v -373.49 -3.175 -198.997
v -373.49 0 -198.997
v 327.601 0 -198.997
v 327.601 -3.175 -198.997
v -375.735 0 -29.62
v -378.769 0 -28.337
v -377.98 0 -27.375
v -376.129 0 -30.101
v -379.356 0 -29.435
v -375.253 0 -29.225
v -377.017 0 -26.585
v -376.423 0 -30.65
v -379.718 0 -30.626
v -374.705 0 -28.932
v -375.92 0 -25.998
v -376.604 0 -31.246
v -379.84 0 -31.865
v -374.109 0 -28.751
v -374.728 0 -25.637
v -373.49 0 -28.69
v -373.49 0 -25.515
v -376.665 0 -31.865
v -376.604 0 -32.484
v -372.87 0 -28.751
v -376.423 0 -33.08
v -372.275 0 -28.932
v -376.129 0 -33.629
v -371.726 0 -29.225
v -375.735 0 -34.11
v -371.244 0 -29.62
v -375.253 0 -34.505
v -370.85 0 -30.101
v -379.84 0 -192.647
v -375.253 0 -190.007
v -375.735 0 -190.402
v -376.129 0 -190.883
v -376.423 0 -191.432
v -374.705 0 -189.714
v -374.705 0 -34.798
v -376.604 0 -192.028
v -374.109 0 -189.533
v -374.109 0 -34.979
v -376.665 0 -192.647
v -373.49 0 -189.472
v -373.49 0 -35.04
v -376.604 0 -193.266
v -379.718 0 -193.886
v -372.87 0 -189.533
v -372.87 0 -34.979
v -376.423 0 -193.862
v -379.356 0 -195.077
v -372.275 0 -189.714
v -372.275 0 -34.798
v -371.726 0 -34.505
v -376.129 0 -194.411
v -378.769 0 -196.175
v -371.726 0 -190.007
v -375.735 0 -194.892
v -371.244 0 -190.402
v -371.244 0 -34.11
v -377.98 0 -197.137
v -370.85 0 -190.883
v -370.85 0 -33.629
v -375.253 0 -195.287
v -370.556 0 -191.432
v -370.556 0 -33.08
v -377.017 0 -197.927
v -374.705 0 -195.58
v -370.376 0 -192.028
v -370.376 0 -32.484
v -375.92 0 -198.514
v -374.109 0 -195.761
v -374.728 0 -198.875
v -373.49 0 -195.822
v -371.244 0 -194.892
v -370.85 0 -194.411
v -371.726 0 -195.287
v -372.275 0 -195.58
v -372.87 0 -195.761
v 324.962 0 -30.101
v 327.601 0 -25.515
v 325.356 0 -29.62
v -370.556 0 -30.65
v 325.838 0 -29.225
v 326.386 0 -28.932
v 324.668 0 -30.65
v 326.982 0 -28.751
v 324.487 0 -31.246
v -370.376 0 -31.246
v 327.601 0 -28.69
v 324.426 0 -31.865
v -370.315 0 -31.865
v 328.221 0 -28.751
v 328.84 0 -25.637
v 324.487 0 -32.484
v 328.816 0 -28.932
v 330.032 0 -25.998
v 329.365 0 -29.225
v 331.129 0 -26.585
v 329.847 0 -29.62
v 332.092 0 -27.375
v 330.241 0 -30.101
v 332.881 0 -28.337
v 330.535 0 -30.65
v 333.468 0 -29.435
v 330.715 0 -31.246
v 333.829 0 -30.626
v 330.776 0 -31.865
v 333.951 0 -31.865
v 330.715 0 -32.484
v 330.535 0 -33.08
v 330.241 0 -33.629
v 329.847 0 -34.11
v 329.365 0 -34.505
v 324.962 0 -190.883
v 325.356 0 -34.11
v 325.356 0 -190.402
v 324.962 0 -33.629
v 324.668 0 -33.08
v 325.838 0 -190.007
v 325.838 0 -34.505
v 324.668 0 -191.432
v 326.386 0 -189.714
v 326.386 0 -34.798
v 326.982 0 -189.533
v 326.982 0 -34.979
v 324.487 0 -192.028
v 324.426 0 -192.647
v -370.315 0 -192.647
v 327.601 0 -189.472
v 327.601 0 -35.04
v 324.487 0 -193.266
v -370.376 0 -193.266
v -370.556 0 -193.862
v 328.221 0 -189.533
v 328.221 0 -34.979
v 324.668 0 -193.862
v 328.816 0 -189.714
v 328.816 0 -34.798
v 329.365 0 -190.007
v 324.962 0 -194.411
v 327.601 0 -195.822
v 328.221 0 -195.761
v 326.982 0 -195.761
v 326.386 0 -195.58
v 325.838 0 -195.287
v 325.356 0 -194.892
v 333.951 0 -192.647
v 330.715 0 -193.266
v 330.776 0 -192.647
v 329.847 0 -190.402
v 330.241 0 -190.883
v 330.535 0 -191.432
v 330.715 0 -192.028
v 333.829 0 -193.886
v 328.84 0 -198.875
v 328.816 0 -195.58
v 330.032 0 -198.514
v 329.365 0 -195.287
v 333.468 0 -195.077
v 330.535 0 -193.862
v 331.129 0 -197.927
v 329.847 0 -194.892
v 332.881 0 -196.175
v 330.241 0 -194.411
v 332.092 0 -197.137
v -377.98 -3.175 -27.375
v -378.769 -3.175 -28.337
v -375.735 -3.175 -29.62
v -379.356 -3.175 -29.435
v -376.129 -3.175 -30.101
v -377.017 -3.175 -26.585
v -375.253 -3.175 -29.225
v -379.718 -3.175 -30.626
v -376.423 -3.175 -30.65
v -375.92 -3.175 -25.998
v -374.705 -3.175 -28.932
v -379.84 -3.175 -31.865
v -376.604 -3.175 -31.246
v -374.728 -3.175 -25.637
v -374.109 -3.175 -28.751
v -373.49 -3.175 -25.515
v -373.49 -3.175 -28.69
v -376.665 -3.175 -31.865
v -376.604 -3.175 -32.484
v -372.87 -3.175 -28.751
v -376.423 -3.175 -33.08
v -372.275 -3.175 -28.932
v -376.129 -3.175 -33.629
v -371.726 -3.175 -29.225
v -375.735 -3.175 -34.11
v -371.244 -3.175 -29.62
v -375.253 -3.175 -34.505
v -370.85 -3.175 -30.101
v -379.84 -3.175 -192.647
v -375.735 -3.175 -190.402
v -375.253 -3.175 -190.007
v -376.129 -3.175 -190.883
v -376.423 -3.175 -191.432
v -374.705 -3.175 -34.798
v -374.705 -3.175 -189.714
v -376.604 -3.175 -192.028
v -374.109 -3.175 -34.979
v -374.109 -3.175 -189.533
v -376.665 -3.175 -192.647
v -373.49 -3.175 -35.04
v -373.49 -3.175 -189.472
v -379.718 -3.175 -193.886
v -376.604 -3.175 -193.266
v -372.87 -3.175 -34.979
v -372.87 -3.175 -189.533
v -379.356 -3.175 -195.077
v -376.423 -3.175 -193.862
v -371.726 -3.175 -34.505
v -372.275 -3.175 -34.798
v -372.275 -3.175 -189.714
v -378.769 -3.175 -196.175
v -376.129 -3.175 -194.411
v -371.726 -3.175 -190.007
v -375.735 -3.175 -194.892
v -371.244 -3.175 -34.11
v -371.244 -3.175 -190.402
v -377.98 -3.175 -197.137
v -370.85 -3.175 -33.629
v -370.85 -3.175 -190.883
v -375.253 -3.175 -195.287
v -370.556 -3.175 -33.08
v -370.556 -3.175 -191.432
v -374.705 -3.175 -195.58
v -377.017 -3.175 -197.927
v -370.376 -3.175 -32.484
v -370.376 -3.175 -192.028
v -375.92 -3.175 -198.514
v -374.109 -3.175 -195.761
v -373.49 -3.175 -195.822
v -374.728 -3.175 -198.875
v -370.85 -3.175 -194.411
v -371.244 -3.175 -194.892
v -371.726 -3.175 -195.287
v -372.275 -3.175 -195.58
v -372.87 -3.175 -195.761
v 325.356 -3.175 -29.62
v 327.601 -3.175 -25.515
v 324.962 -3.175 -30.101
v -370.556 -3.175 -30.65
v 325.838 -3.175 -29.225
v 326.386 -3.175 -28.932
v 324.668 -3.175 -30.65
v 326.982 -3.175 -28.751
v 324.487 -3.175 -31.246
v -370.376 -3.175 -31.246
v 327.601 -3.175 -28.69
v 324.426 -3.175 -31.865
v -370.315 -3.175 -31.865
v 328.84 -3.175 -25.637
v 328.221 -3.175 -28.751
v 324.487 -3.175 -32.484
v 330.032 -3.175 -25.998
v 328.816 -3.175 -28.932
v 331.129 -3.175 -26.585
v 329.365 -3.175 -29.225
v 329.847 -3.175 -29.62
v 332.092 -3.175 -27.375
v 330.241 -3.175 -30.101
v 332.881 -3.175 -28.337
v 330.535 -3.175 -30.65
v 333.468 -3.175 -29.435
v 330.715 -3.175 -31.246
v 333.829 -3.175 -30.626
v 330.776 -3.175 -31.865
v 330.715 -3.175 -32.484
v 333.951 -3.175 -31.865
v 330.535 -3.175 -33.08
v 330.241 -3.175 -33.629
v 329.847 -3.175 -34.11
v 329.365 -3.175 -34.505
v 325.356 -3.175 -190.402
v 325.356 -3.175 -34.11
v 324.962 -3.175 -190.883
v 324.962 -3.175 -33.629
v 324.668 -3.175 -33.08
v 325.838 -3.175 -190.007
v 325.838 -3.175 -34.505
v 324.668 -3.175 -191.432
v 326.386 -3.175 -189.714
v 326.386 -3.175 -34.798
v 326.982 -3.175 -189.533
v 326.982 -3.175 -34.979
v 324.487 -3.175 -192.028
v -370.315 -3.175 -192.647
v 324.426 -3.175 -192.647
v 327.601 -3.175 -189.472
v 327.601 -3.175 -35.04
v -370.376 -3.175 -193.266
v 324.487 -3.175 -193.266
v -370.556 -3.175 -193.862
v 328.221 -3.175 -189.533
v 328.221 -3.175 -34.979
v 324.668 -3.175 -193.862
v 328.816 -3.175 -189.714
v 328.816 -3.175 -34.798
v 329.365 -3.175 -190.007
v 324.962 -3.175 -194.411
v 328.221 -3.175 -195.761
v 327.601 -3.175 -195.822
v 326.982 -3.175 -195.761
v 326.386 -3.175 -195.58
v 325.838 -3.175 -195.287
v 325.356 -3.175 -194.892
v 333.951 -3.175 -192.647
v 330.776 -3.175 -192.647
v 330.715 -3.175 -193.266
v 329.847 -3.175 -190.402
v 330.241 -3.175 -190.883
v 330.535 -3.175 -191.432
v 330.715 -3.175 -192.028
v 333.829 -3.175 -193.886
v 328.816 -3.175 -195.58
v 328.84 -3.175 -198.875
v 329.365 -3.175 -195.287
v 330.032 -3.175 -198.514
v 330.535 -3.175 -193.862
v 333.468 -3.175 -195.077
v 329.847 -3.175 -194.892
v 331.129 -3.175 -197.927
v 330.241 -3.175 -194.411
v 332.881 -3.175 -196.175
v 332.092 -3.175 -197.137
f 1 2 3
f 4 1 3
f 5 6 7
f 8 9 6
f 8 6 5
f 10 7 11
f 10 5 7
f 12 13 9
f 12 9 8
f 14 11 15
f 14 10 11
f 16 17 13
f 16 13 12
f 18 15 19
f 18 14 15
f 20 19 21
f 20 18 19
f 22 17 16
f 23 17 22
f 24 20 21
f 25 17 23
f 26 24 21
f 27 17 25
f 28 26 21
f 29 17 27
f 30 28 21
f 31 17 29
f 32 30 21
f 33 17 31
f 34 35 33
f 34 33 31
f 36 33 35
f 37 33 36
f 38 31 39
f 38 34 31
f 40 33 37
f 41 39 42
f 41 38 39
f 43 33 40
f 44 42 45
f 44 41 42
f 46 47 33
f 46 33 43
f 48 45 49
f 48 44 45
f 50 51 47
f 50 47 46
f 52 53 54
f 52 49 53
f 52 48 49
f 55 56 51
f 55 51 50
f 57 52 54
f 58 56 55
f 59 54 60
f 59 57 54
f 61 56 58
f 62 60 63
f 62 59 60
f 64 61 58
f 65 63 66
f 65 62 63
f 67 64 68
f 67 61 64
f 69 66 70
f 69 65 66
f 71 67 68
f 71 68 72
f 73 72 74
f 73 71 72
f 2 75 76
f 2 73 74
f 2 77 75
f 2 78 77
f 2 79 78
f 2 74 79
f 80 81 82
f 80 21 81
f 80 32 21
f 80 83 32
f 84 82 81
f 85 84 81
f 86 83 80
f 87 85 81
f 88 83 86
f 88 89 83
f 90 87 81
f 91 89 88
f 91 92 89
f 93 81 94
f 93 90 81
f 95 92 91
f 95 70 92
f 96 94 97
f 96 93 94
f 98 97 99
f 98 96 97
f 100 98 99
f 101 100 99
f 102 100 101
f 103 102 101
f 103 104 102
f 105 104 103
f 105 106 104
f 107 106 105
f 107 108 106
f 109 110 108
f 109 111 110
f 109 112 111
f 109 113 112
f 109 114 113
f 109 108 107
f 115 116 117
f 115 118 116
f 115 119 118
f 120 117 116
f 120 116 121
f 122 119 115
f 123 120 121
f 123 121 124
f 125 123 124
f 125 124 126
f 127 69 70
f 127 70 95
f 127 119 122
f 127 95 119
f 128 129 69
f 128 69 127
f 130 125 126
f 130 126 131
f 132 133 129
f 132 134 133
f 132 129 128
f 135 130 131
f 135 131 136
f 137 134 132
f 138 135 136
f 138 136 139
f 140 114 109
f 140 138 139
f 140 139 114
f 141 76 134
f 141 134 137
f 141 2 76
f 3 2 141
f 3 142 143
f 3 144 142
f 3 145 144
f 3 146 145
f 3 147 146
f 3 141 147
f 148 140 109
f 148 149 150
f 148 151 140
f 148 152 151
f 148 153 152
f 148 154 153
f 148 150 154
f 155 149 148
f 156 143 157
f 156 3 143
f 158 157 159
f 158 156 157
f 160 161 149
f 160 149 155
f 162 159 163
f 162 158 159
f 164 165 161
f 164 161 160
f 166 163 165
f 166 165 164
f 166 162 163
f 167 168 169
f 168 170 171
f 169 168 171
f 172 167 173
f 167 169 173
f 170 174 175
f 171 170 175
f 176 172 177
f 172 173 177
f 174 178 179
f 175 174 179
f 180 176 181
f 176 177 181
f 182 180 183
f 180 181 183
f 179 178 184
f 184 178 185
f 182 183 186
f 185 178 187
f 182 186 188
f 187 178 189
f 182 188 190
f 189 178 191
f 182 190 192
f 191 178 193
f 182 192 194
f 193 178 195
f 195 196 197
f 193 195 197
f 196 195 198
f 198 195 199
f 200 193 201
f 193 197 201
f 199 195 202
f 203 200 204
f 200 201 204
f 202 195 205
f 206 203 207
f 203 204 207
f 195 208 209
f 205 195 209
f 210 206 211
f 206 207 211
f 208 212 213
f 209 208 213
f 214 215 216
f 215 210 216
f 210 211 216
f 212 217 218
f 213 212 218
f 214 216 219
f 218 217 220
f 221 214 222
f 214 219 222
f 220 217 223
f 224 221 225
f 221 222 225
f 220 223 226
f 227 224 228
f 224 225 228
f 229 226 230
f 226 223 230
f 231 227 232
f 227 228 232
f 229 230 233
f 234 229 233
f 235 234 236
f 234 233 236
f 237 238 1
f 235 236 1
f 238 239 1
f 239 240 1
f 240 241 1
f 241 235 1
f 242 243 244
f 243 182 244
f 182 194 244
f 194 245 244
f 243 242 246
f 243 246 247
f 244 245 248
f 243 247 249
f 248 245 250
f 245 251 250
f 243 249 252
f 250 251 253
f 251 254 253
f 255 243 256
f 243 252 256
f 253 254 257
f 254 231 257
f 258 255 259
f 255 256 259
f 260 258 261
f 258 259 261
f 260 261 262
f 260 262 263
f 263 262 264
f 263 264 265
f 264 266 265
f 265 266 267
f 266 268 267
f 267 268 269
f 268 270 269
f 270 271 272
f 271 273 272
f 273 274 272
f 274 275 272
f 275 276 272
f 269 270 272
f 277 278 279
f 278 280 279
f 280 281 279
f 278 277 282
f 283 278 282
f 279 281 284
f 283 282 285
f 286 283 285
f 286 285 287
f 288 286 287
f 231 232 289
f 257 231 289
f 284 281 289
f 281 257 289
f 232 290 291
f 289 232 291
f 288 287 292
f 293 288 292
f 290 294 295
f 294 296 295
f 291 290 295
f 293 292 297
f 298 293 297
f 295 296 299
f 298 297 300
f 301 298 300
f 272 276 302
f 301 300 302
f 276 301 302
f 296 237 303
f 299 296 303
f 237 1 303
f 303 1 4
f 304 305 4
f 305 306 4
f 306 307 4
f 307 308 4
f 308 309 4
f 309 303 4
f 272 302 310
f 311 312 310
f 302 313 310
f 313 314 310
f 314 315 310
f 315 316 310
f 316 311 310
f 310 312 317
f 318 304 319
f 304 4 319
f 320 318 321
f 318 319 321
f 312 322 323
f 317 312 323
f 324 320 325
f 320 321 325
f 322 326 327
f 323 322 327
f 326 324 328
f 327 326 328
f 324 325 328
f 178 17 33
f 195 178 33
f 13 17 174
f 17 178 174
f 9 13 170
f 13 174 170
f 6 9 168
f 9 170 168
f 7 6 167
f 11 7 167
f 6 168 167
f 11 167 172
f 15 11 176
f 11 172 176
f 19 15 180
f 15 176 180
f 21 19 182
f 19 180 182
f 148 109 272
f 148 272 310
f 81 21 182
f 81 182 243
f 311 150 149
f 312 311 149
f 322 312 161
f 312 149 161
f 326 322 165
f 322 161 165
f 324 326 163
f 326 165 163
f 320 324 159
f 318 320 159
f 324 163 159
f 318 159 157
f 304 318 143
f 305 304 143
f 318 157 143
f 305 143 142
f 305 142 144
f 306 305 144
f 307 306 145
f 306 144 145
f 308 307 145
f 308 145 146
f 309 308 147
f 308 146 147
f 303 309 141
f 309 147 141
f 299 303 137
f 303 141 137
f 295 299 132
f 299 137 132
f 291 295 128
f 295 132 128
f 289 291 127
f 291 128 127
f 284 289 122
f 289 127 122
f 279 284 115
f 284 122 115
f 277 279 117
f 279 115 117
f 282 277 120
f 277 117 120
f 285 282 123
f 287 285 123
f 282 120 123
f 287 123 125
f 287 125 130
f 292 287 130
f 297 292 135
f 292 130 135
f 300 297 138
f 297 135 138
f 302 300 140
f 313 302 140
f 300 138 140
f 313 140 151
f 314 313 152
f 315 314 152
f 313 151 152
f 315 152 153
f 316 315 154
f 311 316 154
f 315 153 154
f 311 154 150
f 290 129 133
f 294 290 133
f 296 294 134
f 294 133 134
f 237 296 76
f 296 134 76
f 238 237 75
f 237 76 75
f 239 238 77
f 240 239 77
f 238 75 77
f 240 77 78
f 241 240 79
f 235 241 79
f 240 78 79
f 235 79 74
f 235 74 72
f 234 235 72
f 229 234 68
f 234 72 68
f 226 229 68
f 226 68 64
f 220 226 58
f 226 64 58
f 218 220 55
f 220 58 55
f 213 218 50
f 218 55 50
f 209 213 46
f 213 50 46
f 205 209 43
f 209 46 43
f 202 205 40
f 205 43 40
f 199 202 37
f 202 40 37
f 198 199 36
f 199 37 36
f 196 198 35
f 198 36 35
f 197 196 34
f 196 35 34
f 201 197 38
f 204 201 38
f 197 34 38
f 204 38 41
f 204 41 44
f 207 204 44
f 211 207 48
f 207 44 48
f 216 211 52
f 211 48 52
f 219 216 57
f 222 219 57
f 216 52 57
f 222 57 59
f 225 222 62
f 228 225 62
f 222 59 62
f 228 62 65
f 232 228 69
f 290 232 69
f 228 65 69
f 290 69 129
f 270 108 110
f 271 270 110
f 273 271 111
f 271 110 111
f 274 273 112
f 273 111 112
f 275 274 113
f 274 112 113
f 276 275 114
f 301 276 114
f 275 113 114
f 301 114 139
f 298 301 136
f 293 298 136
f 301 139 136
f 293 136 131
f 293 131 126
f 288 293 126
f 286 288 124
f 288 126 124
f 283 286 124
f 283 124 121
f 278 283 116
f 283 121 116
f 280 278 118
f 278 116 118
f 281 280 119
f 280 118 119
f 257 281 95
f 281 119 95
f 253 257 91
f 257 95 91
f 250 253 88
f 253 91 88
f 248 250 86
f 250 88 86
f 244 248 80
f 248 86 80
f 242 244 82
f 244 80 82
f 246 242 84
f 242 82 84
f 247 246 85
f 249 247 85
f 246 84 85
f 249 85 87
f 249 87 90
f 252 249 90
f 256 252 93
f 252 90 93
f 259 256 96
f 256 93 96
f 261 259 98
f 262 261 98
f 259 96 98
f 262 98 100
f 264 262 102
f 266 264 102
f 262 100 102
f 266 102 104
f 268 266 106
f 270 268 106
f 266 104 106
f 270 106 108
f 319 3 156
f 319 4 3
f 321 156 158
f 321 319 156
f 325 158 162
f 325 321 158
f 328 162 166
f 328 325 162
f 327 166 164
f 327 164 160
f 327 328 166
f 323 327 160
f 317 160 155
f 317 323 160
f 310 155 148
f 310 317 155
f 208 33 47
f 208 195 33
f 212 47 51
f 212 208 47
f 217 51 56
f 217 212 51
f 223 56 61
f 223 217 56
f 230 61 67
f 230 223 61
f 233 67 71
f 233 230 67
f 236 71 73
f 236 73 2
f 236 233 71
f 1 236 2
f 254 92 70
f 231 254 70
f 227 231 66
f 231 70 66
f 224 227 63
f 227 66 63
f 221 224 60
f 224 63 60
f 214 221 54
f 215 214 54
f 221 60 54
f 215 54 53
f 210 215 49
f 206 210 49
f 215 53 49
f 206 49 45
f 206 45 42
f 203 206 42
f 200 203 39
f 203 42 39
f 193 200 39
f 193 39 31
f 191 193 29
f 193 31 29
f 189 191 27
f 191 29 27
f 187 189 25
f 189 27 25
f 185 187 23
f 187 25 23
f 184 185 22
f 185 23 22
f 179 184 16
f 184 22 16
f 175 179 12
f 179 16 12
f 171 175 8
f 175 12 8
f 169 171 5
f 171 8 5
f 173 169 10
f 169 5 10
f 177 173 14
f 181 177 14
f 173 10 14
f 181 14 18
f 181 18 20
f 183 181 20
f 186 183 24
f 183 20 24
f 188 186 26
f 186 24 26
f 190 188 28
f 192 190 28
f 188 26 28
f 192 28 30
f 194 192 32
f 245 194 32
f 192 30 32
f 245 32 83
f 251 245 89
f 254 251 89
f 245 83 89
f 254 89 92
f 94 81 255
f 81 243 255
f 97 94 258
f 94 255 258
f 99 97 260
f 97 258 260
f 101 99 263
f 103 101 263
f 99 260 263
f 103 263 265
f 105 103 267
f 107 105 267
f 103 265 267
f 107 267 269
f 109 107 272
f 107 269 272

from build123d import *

# Parameters (mm, degrees)
SKETCH1_W           = 713.791017653
SKETCH1_H           = 173.482
SKETCH1_R           = 3.175
BOSS_EXTRUDE1_DEPTH = 3.175
FILLET1_R           = 6.35


with BuildPart() as part:
    # Sketch1 → Boss-Extrude1 (new body)
    with BuildSketch(Plane(origin=(0, 0, 0), x_dir=(1, 0, 0), z_dir=(0, 1, 0))):
        with Locations((-22.944046964, 112.256050824)):
            Rectangle(SKETCH1_W, SKETCH1_H)
        with Locations((327.601461862, 192.647050824)):
            Circle(SKETCH1_R, mode=Mode.SUBTRACT)
        with Locations((327.601461862, 31.865050824)):
            Circle(SKETCH1_R, mode=Mode.SUBTRACT)
        with Locations((-373.489555791, 31.865050824)):
            Circle(SKETCH1_R, mode=Mode.SUBTRACT)
        with Locations((-373.489555791, 192.647050824)):
            Circle(SKETCH1_R, mode=Mode.SUBTRACT)
    extrude(amount=-BOSS_EXTRUDE1_DEPTH)

    # Fillet1
    fillet1_edges = [part.edges().sort_by_distance(p)[0] for p in [
        (333.951461862, -1.5875, -25.515050824),
        (-379.839555791, -1.5875, -25.515050824),
        (-379.839555791, -1.5875, -198.997050824),
        (333.951461862, -1.5875, -198.997050824),
    ]]
    fillet(fillet1_edges, radius=FILLET1_R)


solid = part.part
